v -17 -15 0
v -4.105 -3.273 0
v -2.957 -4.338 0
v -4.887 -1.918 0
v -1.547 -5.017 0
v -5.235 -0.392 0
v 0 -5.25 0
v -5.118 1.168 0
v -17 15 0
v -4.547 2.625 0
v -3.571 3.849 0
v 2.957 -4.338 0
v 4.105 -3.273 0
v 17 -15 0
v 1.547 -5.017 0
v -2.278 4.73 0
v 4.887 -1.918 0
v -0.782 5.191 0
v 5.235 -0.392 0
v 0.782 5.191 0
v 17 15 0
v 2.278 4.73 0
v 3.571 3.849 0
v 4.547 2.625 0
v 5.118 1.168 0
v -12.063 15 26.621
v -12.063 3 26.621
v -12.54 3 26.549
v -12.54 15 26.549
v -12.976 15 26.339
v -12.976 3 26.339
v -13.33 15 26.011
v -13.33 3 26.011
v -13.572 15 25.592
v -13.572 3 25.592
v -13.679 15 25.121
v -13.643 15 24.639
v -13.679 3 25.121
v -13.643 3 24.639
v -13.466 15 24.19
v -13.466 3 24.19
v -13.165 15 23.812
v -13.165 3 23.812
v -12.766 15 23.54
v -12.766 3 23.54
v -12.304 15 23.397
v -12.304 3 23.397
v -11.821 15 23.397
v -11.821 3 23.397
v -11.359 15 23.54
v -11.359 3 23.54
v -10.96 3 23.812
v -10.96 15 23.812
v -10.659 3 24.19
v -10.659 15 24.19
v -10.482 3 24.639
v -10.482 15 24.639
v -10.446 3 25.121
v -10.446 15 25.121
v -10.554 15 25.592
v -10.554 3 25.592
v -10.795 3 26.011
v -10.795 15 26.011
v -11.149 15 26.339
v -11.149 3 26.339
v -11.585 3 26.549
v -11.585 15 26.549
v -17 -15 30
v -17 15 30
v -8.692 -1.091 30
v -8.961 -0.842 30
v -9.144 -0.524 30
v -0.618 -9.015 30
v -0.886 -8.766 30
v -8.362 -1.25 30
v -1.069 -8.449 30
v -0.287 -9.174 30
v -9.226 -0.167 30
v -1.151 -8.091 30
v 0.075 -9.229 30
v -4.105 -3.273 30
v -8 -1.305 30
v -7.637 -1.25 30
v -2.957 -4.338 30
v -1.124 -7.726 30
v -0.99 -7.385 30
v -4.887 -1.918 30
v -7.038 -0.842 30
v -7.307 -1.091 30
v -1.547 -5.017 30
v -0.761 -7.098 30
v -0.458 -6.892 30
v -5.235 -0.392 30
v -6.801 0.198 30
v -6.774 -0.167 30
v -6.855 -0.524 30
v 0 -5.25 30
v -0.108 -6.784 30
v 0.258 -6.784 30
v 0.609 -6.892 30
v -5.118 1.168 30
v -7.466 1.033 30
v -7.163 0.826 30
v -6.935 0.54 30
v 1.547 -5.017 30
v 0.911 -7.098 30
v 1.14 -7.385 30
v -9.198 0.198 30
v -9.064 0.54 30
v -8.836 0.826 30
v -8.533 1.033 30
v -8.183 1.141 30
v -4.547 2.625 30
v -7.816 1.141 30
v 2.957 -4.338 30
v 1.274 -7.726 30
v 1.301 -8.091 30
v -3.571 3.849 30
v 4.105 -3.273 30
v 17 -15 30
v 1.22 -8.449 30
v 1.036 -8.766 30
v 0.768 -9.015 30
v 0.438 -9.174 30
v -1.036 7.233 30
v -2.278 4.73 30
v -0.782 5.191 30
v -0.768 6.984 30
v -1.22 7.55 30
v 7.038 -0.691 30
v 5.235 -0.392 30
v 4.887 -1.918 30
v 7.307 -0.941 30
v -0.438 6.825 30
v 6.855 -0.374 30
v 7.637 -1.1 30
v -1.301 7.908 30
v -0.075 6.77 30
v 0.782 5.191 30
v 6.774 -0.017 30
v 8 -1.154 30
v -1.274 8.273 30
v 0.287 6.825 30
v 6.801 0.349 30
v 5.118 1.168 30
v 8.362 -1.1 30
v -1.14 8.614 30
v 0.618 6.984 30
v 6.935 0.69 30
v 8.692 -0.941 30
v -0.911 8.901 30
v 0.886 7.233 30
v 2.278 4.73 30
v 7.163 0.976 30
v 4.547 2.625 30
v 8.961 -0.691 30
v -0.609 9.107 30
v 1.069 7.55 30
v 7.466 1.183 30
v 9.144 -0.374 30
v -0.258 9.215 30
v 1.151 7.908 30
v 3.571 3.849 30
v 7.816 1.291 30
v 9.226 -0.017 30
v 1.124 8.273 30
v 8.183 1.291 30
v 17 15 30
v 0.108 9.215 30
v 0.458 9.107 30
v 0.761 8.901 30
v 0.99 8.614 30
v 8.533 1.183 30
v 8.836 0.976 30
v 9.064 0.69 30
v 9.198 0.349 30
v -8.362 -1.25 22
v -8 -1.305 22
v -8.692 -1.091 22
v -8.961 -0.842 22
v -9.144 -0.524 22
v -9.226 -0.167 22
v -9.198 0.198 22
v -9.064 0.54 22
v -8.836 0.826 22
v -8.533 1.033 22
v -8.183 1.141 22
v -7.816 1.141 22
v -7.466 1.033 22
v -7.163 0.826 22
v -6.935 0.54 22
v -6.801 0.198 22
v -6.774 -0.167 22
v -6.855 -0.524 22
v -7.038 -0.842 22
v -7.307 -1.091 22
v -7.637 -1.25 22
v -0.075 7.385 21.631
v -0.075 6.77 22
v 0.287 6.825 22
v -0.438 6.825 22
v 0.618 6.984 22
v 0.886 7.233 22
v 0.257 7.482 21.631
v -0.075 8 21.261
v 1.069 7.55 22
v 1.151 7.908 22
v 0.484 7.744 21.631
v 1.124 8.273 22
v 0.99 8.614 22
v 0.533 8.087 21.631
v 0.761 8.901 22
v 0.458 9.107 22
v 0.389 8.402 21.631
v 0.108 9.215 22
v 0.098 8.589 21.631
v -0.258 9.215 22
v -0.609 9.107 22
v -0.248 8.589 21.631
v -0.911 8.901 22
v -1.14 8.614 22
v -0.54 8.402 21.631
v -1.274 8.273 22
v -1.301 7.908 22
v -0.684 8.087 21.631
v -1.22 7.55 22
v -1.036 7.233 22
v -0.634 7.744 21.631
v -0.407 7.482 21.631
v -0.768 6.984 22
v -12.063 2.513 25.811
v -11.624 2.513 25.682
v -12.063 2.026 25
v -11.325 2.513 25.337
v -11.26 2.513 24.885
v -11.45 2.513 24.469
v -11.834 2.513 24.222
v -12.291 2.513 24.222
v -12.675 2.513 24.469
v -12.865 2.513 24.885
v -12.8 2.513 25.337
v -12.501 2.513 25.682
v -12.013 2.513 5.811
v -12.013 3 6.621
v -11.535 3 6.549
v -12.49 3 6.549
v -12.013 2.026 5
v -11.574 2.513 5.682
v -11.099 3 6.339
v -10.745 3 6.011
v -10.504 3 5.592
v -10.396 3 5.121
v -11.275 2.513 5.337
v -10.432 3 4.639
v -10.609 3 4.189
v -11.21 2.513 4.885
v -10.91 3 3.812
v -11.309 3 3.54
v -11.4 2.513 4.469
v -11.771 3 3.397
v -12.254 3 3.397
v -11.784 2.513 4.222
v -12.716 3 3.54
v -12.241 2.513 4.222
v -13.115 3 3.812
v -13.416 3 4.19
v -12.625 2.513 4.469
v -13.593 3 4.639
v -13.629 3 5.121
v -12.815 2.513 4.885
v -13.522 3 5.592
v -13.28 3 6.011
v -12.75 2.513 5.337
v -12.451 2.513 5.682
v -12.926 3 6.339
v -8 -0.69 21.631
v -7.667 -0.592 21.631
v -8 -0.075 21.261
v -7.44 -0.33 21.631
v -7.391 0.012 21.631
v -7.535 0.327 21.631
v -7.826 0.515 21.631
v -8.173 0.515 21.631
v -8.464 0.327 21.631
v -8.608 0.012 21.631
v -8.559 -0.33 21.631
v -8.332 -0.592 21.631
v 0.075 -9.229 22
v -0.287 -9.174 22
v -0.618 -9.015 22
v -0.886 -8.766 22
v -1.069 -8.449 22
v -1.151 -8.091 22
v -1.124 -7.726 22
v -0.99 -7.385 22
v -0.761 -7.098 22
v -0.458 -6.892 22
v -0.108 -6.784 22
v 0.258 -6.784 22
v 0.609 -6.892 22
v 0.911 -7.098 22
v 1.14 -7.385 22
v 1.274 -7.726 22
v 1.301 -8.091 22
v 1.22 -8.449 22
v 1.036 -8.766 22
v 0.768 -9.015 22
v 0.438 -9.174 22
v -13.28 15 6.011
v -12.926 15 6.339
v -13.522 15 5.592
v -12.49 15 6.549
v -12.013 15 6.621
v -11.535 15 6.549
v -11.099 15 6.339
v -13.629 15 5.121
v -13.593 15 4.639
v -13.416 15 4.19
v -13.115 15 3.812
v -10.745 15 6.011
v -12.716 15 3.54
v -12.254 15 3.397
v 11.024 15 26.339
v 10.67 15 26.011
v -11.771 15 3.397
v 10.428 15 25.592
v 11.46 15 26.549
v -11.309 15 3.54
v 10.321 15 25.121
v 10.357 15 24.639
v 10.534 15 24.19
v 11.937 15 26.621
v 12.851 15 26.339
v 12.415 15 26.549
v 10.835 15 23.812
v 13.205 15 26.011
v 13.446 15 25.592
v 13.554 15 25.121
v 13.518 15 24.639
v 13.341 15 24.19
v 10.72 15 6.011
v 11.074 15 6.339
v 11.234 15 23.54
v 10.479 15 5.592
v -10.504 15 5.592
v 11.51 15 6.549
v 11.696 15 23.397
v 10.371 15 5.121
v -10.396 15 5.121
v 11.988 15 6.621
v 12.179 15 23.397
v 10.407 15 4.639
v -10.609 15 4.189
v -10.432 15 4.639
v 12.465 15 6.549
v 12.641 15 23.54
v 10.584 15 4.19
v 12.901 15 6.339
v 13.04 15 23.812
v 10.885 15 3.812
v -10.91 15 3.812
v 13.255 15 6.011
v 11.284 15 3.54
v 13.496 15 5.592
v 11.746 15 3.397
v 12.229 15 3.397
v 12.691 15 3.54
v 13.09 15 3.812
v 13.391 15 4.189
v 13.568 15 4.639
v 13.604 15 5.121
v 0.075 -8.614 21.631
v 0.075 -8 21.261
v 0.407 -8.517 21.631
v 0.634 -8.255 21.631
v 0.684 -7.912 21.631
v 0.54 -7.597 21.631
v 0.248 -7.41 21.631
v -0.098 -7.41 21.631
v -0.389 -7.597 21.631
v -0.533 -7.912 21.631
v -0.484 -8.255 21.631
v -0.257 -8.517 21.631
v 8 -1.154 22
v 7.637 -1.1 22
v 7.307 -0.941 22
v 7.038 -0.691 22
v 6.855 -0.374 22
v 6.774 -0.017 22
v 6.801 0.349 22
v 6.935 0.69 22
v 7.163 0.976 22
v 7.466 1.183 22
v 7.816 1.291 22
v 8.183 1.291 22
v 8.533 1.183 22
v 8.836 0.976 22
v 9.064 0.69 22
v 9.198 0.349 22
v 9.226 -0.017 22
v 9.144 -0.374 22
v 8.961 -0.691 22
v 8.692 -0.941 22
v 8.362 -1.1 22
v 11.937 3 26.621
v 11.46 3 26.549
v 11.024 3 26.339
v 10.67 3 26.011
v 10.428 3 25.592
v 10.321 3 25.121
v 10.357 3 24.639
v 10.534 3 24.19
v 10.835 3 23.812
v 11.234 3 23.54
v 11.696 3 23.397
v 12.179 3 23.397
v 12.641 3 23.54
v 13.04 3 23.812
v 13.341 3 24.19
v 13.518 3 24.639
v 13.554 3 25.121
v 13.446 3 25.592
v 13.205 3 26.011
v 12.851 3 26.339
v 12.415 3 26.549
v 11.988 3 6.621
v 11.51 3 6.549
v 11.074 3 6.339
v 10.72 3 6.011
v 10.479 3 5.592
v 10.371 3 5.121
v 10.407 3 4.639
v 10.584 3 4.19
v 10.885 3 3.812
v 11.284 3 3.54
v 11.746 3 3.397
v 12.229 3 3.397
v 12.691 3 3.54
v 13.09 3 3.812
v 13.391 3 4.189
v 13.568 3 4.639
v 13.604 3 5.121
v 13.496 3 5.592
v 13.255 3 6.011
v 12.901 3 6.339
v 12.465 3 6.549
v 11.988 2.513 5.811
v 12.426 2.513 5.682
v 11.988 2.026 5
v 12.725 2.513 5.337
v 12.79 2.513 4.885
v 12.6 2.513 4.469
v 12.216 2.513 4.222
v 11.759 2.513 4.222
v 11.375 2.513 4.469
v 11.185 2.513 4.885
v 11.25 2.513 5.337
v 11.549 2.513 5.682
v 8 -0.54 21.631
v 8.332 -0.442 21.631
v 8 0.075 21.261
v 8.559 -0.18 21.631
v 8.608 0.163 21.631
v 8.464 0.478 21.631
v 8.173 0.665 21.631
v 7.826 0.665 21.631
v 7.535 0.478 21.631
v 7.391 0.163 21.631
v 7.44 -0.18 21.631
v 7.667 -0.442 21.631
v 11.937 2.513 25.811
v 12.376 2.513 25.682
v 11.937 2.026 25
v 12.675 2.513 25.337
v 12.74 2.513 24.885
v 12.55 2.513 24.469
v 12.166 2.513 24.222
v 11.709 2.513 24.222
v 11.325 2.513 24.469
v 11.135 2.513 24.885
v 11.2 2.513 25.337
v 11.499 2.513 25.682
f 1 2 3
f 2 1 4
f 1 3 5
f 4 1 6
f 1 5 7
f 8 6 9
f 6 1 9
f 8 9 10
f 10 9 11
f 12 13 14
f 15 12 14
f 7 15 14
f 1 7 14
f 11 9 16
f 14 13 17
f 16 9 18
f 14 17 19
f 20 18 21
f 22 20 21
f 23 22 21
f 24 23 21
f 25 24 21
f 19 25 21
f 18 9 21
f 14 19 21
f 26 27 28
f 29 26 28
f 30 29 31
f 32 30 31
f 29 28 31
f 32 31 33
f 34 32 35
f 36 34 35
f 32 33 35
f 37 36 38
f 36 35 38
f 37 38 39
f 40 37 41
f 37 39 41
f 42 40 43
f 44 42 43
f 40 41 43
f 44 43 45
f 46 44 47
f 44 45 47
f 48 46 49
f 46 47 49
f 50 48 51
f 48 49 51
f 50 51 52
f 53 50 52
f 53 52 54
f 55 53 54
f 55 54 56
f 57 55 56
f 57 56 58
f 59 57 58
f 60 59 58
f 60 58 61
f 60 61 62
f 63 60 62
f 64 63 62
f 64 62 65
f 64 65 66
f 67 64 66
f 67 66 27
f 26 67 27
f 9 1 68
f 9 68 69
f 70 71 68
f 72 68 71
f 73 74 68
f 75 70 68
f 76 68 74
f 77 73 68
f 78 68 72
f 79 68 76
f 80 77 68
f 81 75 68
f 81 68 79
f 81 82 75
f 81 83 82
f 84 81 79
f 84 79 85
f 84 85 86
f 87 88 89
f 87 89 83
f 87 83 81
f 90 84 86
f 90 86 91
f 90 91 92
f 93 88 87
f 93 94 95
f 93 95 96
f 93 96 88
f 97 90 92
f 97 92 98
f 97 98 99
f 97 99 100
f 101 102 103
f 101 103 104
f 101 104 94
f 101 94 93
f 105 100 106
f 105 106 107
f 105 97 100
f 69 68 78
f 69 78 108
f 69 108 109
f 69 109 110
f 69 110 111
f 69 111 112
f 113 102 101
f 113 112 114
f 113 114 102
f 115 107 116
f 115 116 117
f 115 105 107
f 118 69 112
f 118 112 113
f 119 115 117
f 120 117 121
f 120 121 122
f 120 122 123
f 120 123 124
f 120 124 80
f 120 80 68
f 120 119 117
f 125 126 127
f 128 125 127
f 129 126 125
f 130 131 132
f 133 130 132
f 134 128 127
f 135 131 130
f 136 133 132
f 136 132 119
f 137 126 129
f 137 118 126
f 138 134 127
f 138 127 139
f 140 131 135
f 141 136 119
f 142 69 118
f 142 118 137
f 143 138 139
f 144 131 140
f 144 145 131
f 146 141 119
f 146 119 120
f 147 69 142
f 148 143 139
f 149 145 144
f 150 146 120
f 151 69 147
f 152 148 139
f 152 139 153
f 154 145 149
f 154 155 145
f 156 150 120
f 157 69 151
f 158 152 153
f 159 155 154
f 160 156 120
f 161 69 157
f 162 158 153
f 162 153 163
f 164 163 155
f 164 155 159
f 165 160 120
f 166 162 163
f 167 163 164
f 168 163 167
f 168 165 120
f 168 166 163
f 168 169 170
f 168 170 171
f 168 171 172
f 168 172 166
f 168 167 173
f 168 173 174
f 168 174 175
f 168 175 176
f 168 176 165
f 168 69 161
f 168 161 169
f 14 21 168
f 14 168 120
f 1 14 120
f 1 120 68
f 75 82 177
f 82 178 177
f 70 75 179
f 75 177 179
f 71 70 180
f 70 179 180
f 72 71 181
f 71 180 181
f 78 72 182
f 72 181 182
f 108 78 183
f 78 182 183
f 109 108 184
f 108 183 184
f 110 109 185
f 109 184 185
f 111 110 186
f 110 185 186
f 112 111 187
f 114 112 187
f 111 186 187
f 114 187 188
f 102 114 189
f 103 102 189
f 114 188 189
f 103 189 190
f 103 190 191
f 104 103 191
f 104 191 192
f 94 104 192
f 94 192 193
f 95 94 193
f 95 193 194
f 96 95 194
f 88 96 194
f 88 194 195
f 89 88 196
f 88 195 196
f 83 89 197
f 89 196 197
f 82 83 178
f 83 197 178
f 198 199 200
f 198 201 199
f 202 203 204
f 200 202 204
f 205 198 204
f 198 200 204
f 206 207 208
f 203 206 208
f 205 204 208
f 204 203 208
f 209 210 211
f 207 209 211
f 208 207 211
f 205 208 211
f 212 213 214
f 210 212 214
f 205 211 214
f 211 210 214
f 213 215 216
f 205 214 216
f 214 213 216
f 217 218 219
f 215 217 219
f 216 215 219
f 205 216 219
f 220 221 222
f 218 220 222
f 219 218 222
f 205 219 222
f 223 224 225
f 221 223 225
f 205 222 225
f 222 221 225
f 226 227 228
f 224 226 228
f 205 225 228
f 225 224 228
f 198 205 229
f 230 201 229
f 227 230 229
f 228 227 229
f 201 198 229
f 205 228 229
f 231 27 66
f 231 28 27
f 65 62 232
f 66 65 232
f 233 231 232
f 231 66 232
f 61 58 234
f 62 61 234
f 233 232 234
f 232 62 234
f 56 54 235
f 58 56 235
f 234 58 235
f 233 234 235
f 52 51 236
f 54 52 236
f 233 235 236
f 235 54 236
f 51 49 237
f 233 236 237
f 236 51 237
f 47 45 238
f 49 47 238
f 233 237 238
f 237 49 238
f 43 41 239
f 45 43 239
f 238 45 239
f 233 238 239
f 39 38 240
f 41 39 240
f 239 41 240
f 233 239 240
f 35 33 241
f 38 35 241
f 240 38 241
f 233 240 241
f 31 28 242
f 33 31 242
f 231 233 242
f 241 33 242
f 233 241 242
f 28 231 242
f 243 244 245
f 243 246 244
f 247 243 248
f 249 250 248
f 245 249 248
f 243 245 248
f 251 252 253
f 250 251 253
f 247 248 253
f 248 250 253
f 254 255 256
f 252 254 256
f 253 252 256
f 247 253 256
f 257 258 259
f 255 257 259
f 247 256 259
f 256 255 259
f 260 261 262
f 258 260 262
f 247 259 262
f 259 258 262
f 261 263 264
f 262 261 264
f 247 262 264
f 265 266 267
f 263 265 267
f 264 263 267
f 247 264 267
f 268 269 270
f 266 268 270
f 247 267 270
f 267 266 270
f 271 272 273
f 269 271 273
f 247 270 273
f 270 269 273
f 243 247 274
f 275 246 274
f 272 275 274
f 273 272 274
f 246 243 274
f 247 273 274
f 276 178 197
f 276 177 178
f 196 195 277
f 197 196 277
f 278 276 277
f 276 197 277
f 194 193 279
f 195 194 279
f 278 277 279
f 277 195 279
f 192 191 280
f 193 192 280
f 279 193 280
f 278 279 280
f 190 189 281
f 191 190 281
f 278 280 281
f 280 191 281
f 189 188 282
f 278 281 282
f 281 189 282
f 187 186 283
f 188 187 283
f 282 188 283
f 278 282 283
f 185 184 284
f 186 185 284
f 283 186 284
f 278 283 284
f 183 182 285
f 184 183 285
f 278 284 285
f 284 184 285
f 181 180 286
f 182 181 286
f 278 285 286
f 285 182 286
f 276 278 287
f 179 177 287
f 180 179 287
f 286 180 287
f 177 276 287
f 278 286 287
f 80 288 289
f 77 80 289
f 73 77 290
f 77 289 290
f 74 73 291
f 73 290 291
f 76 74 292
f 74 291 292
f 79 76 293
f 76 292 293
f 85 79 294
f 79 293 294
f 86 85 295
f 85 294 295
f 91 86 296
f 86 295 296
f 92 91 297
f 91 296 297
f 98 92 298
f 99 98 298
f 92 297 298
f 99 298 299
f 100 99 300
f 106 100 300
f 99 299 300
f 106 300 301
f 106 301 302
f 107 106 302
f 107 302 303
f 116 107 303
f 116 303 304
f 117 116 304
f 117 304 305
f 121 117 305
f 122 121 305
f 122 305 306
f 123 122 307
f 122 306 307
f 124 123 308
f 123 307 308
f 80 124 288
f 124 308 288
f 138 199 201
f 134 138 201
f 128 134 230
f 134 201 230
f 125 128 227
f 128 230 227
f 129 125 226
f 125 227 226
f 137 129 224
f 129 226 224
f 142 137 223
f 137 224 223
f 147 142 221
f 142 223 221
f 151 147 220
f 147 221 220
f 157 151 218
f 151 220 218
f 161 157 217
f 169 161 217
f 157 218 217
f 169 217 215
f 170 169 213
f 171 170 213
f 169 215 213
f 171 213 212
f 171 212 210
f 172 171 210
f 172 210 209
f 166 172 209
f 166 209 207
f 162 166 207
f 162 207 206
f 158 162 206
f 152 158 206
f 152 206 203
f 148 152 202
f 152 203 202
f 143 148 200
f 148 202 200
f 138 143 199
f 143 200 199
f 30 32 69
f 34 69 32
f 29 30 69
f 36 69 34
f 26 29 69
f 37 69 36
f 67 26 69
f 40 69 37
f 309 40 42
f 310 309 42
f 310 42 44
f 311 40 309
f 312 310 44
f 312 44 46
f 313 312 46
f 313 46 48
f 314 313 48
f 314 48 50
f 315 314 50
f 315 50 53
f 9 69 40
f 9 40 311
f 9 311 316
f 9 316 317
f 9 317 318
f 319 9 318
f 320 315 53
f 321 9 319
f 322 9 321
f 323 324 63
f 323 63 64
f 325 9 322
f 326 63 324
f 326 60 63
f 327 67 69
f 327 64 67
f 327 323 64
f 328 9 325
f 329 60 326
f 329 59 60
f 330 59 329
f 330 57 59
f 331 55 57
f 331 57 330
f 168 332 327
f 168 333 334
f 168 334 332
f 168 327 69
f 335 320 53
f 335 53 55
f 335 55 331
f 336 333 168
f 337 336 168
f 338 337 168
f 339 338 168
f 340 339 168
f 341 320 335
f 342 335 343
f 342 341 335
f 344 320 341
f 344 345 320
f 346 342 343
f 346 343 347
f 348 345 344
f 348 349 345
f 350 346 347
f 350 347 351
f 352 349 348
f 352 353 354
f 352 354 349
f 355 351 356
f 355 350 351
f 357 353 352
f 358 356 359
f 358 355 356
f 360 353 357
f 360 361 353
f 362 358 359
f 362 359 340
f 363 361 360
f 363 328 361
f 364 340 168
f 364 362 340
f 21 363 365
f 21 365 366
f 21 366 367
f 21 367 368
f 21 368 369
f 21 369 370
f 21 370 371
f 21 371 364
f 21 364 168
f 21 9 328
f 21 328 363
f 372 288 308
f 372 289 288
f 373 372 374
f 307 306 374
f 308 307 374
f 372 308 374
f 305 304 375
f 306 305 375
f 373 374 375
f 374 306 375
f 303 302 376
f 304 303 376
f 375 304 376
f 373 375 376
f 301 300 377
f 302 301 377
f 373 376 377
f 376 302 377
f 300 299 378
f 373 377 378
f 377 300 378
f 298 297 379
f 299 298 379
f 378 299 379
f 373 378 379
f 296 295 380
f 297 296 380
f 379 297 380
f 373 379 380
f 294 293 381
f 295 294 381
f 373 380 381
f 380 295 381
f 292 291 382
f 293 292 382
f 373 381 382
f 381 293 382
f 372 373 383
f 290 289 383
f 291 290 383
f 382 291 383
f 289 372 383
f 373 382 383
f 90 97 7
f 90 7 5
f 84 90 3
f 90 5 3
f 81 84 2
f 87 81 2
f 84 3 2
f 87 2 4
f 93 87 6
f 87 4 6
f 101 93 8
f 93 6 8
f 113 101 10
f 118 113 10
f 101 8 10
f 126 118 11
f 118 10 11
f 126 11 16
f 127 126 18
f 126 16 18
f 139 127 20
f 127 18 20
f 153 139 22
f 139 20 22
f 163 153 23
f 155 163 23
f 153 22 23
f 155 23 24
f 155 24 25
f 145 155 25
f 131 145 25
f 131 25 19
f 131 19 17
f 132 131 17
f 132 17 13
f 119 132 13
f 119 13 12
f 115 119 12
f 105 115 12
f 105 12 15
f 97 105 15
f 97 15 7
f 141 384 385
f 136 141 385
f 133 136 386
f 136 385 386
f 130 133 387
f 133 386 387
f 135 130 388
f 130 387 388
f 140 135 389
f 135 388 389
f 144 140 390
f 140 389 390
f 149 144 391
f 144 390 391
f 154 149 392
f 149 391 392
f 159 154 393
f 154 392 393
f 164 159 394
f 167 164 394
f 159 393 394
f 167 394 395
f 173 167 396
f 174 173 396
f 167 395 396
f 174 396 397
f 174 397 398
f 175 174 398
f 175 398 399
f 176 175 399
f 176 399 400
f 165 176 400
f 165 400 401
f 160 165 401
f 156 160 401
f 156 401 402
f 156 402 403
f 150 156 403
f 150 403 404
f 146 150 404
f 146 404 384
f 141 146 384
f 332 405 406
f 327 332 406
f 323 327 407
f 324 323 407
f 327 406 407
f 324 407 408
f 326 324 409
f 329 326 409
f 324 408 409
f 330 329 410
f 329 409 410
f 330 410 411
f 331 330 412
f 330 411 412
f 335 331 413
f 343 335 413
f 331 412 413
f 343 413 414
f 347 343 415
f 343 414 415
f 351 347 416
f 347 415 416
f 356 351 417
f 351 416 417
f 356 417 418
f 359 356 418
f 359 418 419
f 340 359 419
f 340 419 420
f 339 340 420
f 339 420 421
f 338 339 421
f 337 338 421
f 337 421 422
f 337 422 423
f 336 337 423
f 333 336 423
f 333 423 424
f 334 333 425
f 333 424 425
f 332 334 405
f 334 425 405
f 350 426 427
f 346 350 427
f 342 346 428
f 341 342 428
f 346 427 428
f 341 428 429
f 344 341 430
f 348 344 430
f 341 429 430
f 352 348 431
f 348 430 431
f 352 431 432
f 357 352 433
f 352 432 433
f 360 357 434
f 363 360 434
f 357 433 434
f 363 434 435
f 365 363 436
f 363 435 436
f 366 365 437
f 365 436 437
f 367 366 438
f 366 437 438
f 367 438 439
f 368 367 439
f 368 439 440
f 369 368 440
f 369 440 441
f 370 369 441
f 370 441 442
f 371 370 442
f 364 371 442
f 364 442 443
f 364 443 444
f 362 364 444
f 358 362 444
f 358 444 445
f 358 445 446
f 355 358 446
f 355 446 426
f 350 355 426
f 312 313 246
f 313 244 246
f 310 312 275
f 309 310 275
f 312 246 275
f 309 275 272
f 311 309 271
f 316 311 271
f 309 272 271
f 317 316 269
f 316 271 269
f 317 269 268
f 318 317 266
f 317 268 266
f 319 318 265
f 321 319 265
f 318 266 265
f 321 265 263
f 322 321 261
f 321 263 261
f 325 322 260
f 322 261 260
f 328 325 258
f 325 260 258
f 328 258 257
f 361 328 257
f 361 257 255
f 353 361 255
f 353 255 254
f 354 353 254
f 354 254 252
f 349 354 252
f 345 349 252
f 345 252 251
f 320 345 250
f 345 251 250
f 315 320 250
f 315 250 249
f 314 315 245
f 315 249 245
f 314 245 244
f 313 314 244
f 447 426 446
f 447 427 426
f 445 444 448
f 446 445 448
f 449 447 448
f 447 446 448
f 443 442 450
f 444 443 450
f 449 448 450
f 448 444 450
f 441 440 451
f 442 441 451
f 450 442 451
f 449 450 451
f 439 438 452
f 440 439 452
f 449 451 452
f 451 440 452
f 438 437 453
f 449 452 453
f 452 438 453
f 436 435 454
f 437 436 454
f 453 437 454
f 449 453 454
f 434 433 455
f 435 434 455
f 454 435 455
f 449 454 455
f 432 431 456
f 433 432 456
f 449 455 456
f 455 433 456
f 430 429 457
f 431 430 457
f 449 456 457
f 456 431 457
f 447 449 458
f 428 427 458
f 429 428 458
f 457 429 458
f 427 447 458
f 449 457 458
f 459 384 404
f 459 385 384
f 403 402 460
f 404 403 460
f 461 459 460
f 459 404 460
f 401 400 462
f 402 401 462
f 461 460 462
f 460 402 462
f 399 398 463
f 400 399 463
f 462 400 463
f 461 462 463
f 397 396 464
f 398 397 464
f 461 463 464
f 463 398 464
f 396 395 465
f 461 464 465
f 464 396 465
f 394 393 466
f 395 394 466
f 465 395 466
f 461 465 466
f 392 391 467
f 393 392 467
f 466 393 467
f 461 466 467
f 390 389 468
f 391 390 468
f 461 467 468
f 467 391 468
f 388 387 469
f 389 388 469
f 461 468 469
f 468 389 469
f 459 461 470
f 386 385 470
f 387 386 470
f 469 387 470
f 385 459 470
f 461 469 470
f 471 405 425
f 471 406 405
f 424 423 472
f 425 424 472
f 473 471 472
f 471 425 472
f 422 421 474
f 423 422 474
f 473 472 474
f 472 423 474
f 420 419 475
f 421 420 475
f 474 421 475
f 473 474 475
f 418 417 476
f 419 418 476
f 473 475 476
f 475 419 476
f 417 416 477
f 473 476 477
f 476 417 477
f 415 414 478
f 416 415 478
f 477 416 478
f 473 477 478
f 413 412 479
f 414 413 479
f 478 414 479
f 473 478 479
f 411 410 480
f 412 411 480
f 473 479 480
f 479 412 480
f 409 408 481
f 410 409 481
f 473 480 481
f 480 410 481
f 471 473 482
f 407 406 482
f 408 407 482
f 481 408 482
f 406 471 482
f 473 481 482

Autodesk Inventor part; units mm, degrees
ref_plane "YZ Plane" through (0, 0, 0) normal (1, 0, 0) x (0, 1, 0)
ref_plane "XZ Plane" through (0, 0, 0) normal (0, 1, 0) x (-1, 0, 0)
ref_plane "XY Plane" through (0, 0, 0) normal (0, 0, 1) x (1, 0, 0)
sketch "Esboço1" plane through (0, 0, 0) normal (0, 0, 1) x (1, 0, 0)
  line L0 (-17, 15) -> (17, 15)
  line L1 (17, 15) -> (17, -15)
  line L2 (17, -15) -> (-17, -15)
  line L3 (-17, -15) -> (-17, 15)
  line L4 (-17, 15) -> (17, -15) construction
  line L5 (17, 15) -> (-17, -15) construction
  point P0 (0, 0)
  dimension "d0" = 34
  dimension "d1" = 30
extrude "Extrusão1" add sketch "Esboço1" along normal blind 30
sketch "Esboço2" plane through (0, 0, 30) normal (0, 0, 1) x (1, 0, 0)
  circle A0 centre (0, 0) radius 8 construction
  circle A1 centre (-0.0751, 7.9996) radius 1 construction
  circle A2 centre (0, 0) radius 8 construction
  circle A3 centre (-7.9996, -0.0751) radius 1 construction
  circle A4 centre (0, 0) radius 8 construction
  circle A5 centre (0.0751, -7.9996) radius 1 construction
  circle A6 centre (0, 0) radius 8 construction
  circle A7 centre (7.9996, 0.0751) radius 1 construction
  dimension "d4" = 16
  dimension "d5" = 2
  dimension "d8" = 360
hole "Furo1" at (-0.0751, 7.9996, 30) at (-7.9996, -0.0751, 30) at (7.9996, 0.0751, 30) at (0.0751, -7.9996, 30) direction (0, 0, -1) diameter 2.459 depth 8 tip angle 118 thread size "M3x0.5" class "6H" standard "ANSI Metric M Profile"
sketch "Esboço3" plane through (0, 0, 30) normal (0, 0, 1) x (1, 0, 0)
  circle A0 centre (0, 0) radius 5.25
  dimension "d17" = 10.5
hole "Furo2" at (0, 0, 30) direction (0, 0, -1) diameter 10.5 end through all
sketch "Esboço4" plane through (-17, 15, 0) normal (0, 1, 0) x (1, 0, 0)
  line L0 (0, 0) -> (0, -30) construction
  line L1 (0, -15) -> (34, -15) construction
  line L2 (34, 0) -> (34, -30) construction
  line L3 (18.1544, -30) -> (15.6954, -30) construction
  line L4 (16.9249, -30) -> (17, 0) construction
  line L5 (11.75, 0) -> (22.25, 0) construction
  circle A0 centre (4.9874, -5) radius 1 construction
  circle A1 centre (28.9875, -5) radius 1 construction
  circle A2 centre (28.9374, -25) radius 1 construction
  circle A3 centre (4.9374, -25) radius 1 construction
  dimension "d25" = 2
  dimension "d26" = 2
  dimension "d27" = 2
  dimension "d28" = 2
  dimension "d29" = 10
  dimension "d30" = 10
  dimension "d31" = 10
  dimension "d32" = 10
  dimension "d33" = 12
  dimension "d34" = 12
  dimension "d35" = 12
  dimension "d36" = 12
hole "Furo3" at (-12.0626, 15, 25) at (-12.0126, 15, 5) at (11.9875, 15, 5) at (11.9374, 15, 25) direction (0, -1, 0) diameter 3.242 depth 12 tip angle 118 thread size "M4x0.7" class "6H" standard "ANSI Metric M Profile"
equation "\"d30\" = d29"
equation "\"d31\" = d29"
equation "\"d32\" = d29"
equation "\"d34\" = d33"
equation "\"d35\" = d33"
equation "\"d36\" = d33"
properties part number "SuporteCastanhaTr8"
